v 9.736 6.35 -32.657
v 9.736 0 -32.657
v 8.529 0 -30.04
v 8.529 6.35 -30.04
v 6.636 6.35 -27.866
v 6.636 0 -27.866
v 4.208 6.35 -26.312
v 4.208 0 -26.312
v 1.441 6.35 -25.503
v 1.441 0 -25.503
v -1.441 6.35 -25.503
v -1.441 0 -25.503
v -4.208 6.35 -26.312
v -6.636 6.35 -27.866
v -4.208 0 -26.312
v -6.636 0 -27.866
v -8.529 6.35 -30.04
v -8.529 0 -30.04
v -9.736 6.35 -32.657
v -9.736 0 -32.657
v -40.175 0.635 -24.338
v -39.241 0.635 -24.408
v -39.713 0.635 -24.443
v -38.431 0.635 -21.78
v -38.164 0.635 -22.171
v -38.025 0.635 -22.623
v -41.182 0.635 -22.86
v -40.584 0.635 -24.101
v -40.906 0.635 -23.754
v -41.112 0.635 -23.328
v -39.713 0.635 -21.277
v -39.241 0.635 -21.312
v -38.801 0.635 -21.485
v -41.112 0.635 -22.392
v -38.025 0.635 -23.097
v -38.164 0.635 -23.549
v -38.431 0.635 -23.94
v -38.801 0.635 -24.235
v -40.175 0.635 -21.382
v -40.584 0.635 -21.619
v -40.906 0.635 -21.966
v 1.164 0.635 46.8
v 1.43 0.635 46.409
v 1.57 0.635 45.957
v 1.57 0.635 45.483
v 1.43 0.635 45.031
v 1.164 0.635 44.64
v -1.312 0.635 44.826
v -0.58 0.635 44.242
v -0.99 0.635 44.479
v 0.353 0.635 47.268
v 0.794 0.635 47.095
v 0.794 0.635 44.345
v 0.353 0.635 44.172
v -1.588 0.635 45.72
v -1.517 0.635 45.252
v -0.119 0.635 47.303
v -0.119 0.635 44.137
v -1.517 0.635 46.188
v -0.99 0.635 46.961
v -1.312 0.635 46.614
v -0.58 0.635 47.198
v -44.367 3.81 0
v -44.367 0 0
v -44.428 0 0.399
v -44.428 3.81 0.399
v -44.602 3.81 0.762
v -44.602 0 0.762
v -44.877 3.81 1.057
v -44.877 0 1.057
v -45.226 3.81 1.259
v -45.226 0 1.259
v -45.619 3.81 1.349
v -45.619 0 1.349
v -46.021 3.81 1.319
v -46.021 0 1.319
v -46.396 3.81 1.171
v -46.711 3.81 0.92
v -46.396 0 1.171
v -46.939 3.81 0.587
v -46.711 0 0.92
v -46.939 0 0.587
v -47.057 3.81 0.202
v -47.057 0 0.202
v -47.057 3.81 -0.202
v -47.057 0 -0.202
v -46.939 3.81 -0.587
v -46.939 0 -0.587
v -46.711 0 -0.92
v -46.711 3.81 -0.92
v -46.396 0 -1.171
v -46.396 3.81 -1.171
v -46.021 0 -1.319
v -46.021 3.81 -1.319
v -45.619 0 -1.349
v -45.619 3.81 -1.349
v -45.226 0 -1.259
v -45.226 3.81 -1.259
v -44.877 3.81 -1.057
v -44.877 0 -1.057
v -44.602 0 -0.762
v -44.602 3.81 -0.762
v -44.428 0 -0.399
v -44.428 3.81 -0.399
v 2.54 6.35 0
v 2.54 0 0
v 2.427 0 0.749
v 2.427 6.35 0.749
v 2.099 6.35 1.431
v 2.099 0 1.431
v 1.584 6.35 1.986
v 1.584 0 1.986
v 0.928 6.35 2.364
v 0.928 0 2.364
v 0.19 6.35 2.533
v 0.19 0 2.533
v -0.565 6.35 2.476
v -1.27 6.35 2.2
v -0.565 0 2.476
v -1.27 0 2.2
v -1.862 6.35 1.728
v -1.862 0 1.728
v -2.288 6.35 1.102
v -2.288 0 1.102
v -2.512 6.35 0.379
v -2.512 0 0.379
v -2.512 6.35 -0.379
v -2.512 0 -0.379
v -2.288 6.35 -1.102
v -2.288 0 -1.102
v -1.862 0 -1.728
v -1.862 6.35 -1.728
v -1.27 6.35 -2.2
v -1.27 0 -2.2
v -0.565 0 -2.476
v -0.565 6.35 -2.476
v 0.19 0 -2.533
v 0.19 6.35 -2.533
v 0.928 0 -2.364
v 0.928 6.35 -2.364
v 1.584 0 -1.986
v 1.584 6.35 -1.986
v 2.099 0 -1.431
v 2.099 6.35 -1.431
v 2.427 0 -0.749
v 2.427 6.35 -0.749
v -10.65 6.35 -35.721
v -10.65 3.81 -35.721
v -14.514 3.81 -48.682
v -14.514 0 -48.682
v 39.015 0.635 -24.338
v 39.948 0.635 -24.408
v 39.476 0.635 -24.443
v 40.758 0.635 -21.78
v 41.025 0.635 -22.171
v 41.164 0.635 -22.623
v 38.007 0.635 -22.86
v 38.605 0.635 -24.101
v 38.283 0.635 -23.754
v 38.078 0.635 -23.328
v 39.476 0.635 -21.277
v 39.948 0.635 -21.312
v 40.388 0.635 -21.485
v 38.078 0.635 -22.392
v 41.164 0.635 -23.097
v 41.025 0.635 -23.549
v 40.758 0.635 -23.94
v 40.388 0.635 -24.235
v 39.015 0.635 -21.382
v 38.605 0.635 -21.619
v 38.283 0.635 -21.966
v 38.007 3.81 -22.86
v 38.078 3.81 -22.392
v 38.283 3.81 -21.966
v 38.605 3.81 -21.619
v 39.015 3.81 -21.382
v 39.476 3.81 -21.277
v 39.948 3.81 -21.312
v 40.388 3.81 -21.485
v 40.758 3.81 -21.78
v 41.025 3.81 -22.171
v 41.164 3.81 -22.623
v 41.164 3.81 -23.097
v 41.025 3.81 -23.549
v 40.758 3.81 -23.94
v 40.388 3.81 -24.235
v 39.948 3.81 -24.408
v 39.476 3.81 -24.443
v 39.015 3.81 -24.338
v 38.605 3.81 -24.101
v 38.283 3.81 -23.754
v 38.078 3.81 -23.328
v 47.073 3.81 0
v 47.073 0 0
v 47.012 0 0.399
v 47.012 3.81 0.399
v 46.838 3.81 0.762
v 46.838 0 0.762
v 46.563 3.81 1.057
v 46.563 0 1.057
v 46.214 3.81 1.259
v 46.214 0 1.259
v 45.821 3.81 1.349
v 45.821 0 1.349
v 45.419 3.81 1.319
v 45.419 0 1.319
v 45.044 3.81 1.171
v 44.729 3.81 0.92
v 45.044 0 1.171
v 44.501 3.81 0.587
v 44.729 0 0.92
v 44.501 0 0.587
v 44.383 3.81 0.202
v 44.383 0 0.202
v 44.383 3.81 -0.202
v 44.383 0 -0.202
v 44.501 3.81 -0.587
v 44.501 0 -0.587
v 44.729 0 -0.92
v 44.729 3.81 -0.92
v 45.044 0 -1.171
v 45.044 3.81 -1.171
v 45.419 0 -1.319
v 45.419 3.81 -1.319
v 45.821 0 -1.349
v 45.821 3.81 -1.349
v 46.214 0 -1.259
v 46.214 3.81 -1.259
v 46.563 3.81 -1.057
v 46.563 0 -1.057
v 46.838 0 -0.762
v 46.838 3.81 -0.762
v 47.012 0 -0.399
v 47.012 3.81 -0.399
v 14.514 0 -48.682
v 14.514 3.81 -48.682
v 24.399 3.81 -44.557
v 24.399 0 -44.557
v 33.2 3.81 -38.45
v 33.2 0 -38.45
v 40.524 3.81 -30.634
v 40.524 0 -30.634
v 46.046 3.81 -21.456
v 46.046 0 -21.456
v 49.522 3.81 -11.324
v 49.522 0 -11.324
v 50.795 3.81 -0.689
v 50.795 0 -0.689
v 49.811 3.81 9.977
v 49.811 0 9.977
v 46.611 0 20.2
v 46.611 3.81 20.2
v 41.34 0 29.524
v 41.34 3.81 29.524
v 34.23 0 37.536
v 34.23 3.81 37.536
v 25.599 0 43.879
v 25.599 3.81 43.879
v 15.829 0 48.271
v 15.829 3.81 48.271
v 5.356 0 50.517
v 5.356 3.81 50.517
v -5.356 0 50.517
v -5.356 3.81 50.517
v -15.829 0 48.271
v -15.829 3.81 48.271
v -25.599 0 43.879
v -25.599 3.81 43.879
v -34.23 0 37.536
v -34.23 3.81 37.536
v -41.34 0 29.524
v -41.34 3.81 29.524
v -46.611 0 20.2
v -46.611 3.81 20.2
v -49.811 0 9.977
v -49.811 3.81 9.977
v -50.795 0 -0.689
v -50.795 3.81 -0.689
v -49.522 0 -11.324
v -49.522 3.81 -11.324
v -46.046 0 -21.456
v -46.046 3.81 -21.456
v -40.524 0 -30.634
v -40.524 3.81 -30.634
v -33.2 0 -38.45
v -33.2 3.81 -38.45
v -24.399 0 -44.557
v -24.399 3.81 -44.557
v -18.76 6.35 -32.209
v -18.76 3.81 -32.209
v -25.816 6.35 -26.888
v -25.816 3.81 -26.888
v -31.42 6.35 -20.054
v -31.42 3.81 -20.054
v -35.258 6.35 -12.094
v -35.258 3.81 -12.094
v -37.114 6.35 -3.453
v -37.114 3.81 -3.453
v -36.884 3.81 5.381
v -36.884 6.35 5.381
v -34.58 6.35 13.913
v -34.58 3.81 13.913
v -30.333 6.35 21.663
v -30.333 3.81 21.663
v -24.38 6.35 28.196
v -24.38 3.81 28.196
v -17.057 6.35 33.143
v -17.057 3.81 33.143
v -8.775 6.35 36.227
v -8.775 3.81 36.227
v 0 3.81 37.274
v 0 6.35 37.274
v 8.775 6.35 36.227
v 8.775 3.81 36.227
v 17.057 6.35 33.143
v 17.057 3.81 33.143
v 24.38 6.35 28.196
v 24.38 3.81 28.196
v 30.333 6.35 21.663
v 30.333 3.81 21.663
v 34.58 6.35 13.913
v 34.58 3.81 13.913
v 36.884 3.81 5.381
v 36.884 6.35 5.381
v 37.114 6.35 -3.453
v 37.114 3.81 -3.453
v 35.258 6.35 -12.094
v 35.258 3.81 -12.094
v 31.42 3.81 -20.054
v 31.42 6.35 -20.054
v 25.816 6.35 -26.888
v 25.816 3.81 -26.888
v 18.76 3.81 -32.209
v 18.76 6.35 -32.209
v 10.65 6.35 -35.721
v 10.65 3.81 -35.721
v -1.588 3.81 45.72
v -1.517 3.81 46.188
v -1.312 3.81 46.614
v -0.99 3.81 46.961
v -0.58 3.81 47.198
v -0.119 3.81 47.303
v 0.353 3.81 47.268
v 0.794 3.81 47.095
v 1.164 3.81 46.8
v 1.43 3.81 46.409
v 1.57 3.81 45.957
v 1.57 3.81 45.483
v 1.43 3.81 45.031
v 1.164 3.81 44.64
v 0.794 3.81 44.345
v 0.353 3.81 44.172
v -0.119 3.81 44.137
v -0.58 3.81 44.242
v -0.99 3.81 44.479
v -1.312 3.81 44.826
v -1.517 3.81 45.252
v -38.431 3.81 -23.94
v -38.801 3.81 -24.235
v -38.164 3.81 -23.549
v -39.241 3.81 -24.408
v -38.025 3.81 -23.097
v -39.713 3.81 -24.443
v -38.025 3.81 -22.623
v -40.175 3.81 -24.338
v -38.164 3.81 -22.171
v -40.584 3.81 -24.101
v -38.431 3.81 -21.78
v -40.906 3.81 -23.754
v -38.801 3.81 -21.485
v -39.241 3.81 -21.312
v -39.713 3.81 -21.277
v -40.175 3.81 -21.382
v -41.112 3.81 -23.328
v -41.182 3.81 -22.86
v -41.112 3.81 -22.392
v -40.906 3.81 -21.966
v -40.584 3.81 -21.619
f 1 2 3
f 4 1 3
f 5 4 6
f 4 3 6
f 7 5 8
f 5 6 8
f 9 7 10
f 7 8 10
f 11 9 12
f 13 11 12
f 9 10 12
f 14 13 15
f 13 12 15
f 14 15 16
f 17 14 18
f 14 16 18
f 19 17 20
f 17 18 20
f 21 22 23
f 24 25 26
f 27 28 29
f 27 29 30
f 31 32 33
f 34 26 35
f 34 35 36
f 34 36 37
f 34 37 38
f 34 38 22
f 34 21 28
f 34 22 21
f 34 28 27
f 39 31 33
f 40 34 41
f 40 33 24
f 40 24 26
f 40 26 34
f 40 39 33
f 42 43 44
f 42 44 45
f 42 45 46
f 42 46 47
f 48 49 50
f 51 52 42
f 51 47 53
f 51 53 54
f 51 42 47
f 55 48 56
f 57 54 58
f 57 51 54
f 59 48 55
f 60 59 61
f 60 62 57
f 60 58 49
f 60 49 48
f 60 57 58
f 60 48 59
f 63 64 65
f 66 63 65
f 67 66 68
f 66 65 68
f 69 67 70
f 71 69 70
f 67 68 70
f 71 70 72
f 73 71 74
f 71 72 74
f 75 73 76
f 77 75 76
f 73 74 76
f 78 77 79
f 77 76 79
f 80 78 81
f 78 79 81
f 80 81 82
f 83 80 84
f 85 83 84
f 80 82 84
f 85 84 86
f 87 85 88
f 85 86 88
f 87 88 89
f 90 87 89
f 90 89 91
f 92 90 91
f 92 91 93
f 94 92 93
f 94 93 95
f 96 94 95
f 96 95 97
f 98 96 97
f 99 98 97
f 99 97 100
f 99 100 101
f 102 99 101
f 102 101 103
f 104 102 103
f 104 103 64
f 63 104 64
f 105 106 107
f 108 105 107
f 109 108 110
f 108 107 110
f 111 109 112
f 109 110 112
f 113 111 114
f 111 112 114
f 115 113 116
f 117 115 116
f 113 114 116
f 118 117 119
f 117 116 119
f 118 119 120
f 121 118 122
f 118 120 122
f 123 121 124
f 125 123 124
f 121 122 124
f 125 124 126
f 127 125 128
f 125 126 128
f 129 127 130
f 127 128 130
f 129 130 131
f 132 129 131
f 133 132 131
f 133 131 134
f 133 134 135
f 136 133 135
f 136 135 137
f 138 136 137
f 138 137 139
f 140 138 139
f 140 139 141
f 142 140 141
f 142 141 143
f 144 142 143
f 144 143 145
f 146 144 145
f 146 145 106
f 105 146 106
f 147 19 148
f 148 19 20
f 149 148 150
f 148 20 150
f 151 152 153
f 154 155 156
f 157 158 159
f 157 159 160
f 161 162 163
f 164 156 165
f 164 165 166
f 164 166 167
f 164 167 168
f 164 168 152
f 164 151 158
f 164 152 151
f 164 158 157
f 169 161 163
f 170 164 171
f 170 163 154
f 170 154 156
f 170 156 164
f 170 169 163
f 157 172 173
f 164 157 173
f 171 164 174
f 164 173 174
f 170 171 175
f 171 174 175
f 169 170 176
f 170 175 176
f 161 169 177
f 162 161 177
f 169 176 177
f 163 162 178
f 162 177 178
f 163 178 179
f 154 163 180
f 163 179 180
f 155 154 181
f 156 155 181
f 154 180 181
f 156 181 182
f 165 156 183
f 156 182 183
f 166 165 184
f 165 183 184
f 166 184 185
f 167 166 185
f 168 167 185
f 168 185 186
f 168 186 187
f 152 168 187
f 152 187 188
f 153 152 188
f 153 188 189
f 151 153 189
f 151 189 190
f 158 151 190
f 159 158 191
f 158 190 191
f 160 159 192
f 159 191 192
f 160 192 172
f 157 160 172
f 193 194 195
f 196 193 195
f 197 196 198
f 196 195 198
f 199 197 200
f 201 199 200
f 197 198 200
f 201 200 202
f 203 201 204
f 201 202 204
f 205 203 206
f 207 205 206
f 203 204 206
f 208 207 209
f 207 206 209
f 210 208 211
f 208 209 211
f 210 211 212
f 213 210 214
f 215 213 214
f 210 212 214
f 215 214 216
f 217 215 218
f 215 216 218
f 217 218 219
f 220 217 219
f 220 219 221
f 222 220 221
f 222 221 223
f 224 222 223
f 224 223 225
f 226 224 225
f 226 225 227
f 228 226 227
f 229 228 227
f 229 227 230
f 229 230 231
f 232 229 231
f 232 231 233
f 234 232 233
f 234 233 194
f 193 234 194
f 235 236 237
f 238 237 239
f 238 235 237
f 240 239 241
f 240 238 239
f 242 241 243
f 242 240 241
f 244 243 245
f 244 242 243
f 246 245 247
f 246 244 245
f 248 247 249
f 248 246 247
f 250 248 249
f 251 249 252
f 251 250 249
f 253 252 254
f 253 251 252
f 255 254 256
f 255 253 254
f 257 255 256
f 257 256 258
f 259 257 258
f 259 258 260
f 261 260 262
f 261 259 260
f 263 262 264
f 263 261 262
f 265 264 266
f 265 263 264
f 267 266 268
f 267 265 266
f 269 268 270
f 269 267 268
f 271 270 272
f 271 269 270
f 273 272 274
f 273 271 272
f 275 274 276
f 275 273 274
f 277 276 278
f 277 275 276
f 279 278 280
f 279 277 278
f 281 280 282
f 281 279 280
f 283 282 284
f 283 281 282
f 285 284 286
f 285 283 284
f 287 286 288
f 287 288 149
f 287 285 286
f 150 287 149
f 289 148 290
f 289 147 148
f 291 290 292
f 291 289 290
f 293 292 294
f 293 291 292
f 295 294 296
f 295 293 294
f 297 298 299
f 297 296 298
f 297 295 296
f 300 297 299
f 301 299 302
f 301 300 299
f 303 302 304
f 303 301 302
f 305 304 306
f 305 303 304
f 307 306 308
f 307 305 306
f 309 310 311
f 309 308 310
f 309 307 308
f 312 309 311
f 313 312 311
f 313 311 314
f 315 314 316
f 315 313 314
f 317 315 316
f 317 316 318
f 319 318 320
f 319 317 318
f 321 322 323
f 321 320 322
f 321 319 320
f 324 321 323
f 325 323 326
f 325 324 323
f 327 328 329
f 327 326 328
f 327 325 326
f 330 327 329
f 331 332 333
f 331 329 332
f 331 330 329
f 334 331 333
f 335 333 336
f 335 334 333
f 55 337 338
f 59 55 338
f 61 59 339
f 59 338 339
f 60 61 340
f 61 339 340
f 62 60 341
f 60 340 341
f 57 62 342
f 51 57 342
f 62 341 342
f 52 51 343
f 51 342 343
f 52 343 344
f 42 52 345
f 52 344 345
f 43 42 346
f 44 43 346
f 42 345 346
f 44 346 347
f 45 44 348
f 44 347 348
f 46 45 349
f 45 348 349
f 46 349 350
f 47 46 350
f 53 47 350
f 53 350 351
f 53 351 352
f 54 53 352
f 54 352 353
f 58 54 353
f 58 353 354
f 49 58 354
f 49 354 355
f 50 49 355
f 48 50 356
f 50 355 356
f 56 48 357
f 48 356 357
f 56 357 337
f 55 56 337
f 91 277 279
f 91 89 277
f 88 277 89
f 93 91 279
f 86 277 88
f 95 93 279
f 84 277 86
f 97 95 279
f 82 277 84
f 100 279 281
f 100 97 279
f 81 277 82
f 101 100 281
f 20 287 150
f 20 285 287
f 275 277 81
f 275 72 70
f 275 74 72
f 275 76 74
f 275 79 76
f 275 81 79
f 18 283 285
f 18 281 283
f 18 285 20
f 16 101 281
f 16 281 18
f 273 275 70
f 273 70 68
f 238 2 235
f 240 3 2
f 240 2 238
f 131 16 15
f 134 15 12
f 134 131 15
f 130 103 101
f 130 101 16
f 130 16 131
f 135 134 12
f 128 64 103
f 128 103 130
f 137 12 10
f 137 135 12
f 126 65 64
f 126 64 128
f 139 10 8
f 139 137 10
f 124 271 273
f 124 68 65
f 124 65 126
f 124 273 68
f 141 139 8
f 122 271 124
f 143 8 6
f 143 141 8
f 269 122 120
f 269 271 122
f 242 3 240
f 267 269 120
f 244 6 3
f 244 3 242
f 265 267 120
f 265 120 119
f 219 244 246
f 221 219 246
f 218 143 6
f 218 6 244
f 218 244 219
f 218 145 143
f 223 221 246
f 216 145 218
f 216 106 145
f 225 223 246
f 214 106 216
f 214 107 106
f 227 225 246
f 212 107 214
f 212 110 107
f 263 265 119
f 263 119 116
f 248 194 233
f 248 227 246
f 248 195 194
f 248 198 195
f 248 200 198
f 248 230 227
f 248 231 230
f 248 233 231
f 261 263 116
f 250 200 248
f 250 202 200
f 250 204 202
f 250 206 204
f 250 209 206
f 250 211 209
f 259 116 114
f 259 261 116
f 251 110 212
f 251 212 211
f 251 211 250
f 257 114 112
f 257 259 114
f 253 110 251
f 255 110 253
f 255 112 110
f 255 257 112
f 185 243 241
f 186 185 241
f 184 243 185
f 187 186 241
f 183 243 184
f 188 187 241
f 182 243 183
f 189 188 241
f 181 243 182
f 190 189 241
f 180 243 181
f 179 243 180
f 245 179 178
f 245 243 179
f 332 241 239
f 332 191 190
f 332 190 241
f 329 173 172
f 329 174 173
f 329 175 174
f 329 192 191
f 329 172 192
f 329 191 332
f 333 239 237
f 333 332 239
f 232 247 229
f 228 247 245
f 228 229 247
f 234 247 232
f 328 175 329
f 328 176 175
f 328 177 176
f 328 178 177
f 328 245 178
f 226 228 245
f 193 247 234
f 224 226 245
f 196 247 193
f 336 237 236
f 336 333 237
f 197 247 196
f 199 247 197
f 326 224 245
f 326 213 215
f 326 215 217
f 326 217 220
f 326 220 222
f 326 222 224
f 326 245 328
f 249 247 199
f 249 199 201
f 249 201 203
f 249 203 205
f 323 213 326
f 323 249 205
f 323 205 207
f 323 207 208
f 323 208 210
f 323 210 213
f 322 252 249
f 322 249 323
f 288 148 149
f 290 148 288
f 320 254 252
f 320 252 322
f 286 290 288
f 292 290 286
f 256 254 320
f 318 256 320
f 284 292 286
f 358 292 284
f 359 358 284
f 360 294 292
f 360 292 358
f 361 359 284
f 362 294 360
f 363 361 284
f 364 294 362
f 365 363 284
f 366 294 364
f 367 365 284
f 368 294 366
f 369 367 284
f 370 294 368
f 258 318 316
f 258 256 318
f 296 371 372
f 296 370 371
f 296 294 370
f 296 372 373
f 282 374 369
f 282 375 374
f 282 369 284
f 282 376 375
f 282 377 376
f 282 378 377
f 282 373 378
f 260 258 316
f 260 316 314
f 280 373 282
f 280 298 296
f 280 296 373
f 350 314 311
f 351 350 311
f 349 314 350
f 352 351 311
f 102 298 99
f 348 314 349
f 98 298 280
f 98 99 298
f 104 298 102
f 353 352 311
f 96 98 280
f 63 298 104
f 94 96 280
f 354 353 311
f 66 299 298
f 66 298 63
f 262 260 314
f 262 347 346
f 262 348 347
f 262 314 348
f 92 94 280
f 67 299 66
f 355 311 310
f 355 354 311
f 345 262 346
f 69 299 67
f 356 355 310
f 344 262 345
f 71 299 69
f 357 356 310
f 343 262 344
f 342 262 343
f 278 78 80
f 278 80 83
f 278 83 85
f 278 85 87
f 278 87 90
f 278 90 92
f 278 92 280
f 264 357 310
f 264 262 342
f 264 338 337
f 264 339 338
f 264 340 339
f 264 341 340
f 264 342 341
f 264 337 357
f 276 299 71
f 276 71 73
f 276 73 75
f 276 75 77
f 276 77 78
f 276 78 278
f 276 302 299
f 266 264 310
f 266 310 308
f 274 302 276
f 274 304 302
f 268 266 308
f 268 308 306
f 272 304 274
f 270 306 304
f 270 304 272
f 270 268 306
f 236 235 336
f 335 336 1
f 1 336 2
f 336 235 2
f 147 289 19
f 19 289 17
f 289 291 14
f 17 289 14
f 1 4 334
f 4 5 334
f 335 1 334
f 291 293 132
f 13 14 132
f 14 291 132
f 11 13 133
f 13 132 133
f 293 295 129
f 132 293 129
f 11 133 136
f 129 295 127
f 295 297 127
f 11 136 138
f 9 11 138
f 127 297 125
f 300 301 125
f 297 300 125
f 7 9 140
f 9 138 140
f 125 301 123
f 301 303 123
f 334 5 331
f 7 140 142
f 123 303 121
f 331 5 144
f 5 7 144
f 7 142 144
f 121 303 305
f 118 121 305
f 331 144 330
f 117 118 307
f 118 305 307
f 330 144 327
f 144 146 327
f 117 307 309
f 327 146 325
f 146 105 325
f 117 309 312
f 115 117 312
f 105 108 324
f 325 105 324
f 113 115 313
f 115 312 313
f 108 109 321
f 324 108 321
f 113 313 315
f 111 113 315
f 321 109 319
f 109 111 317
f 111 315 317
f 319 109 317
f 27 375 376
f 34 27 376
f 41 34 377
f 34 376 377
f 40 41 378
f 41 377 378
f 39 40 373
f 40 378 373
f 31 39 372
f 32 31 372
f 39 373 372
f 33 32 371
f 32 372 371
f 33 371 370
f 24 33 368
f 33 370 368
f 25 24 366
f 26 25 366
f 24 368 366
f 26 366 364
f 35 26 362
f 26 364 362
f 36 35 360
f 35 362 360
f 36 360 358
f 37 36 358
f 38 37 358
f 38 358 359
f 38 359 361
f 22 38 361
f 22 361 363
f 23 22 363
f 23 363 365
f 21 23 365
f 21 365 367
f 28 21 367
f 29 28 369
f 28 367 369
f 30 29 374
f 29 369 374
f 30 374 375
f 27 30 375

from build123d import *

# Parameters (mm, degrees)
F0_R     = 50.8
F1_DEPTH = 6.35
F2_R     = 50.8
F2_R_2   = 37.2745
F3_DEPTH = 2.54
F4_R     = 2.54
F4_R_2   = 1.35255
F5_DEPTH = 6.351
F7_DEPTH = 6.351
F8_R     = 1.5875
F9_DEPTH = 3.175


with BuildPart() as f1:
    # F0 (on Front) → F1 (new body)
    with BuildSketch(Plane.XZ):
        Circle(F0_R)
    extrude(amount=-F1_DEPTH)

    # F2 (on face) → F3 (cut)
    with BuildSketch(Plane(origin=(0, 6.35, 0), x_dir=(-1, 0, 0), z_dir=(0, 1, 0))):
        Circle(F2_R)
        Circle(F2_R_2, mode=Mode.SUBTRACT)
    extrude(amount=-F3_DEPTH, mode=Mode.SUBTRACT)

    # F4 (on face) → F5 (cut, through all)
    with BuildSketch(Plane.XZ):
        Circle(F4_R)
        with Locations((-45.72, 0)):
            Circle(F4_R_2)
        with Locations((45.72, 0)):
            Circle(F4_R_2)
    extrude(amount=-F5_DEPTH, mode=Mode.SUBTRACT)

    # F6 (on face) → F7 (cut, through all)
    with BuildSketch(Plane.XZ):
        with BuildLine():
            ThreePointArc((9.7364788506, -32.6571428571), (0, -25.4), (-9.7364788506, -32.6571428571))
            Line((-9.7364788506, -32.6571428571), (-14.5142857143, -48.682394253))
            ThreePointArc((-14.5142857143, -48.682394253), (0, -50.8), (14.5142857143, -48.682394253))
            Line((14.5142857143, -48.682394253), (9.7364788506, -32.6571428571))
        make_face()
    extrude(amount=-F7_DEPTH, mode=Mode.SUBTRACT)

    # F8 (on face) → F9 (cut)
    with BuildSketch(Plane(origin=(0, 3.81, 0), x_dir=(-1, 0, 0), z_dir=(0, 1, 0))):
        with Locations((0, 45.72)):
            Circle(F8_R)
        with Locations((39.594681461, -22.86)):
            Circle(F8_R)
        with Locations((-39.594681461, -22.86)):
            Circle(F8_R)
    extrude(amount=-F9_DEPTH, mode=Mode.SUBTRACT)


solid = f1.part
